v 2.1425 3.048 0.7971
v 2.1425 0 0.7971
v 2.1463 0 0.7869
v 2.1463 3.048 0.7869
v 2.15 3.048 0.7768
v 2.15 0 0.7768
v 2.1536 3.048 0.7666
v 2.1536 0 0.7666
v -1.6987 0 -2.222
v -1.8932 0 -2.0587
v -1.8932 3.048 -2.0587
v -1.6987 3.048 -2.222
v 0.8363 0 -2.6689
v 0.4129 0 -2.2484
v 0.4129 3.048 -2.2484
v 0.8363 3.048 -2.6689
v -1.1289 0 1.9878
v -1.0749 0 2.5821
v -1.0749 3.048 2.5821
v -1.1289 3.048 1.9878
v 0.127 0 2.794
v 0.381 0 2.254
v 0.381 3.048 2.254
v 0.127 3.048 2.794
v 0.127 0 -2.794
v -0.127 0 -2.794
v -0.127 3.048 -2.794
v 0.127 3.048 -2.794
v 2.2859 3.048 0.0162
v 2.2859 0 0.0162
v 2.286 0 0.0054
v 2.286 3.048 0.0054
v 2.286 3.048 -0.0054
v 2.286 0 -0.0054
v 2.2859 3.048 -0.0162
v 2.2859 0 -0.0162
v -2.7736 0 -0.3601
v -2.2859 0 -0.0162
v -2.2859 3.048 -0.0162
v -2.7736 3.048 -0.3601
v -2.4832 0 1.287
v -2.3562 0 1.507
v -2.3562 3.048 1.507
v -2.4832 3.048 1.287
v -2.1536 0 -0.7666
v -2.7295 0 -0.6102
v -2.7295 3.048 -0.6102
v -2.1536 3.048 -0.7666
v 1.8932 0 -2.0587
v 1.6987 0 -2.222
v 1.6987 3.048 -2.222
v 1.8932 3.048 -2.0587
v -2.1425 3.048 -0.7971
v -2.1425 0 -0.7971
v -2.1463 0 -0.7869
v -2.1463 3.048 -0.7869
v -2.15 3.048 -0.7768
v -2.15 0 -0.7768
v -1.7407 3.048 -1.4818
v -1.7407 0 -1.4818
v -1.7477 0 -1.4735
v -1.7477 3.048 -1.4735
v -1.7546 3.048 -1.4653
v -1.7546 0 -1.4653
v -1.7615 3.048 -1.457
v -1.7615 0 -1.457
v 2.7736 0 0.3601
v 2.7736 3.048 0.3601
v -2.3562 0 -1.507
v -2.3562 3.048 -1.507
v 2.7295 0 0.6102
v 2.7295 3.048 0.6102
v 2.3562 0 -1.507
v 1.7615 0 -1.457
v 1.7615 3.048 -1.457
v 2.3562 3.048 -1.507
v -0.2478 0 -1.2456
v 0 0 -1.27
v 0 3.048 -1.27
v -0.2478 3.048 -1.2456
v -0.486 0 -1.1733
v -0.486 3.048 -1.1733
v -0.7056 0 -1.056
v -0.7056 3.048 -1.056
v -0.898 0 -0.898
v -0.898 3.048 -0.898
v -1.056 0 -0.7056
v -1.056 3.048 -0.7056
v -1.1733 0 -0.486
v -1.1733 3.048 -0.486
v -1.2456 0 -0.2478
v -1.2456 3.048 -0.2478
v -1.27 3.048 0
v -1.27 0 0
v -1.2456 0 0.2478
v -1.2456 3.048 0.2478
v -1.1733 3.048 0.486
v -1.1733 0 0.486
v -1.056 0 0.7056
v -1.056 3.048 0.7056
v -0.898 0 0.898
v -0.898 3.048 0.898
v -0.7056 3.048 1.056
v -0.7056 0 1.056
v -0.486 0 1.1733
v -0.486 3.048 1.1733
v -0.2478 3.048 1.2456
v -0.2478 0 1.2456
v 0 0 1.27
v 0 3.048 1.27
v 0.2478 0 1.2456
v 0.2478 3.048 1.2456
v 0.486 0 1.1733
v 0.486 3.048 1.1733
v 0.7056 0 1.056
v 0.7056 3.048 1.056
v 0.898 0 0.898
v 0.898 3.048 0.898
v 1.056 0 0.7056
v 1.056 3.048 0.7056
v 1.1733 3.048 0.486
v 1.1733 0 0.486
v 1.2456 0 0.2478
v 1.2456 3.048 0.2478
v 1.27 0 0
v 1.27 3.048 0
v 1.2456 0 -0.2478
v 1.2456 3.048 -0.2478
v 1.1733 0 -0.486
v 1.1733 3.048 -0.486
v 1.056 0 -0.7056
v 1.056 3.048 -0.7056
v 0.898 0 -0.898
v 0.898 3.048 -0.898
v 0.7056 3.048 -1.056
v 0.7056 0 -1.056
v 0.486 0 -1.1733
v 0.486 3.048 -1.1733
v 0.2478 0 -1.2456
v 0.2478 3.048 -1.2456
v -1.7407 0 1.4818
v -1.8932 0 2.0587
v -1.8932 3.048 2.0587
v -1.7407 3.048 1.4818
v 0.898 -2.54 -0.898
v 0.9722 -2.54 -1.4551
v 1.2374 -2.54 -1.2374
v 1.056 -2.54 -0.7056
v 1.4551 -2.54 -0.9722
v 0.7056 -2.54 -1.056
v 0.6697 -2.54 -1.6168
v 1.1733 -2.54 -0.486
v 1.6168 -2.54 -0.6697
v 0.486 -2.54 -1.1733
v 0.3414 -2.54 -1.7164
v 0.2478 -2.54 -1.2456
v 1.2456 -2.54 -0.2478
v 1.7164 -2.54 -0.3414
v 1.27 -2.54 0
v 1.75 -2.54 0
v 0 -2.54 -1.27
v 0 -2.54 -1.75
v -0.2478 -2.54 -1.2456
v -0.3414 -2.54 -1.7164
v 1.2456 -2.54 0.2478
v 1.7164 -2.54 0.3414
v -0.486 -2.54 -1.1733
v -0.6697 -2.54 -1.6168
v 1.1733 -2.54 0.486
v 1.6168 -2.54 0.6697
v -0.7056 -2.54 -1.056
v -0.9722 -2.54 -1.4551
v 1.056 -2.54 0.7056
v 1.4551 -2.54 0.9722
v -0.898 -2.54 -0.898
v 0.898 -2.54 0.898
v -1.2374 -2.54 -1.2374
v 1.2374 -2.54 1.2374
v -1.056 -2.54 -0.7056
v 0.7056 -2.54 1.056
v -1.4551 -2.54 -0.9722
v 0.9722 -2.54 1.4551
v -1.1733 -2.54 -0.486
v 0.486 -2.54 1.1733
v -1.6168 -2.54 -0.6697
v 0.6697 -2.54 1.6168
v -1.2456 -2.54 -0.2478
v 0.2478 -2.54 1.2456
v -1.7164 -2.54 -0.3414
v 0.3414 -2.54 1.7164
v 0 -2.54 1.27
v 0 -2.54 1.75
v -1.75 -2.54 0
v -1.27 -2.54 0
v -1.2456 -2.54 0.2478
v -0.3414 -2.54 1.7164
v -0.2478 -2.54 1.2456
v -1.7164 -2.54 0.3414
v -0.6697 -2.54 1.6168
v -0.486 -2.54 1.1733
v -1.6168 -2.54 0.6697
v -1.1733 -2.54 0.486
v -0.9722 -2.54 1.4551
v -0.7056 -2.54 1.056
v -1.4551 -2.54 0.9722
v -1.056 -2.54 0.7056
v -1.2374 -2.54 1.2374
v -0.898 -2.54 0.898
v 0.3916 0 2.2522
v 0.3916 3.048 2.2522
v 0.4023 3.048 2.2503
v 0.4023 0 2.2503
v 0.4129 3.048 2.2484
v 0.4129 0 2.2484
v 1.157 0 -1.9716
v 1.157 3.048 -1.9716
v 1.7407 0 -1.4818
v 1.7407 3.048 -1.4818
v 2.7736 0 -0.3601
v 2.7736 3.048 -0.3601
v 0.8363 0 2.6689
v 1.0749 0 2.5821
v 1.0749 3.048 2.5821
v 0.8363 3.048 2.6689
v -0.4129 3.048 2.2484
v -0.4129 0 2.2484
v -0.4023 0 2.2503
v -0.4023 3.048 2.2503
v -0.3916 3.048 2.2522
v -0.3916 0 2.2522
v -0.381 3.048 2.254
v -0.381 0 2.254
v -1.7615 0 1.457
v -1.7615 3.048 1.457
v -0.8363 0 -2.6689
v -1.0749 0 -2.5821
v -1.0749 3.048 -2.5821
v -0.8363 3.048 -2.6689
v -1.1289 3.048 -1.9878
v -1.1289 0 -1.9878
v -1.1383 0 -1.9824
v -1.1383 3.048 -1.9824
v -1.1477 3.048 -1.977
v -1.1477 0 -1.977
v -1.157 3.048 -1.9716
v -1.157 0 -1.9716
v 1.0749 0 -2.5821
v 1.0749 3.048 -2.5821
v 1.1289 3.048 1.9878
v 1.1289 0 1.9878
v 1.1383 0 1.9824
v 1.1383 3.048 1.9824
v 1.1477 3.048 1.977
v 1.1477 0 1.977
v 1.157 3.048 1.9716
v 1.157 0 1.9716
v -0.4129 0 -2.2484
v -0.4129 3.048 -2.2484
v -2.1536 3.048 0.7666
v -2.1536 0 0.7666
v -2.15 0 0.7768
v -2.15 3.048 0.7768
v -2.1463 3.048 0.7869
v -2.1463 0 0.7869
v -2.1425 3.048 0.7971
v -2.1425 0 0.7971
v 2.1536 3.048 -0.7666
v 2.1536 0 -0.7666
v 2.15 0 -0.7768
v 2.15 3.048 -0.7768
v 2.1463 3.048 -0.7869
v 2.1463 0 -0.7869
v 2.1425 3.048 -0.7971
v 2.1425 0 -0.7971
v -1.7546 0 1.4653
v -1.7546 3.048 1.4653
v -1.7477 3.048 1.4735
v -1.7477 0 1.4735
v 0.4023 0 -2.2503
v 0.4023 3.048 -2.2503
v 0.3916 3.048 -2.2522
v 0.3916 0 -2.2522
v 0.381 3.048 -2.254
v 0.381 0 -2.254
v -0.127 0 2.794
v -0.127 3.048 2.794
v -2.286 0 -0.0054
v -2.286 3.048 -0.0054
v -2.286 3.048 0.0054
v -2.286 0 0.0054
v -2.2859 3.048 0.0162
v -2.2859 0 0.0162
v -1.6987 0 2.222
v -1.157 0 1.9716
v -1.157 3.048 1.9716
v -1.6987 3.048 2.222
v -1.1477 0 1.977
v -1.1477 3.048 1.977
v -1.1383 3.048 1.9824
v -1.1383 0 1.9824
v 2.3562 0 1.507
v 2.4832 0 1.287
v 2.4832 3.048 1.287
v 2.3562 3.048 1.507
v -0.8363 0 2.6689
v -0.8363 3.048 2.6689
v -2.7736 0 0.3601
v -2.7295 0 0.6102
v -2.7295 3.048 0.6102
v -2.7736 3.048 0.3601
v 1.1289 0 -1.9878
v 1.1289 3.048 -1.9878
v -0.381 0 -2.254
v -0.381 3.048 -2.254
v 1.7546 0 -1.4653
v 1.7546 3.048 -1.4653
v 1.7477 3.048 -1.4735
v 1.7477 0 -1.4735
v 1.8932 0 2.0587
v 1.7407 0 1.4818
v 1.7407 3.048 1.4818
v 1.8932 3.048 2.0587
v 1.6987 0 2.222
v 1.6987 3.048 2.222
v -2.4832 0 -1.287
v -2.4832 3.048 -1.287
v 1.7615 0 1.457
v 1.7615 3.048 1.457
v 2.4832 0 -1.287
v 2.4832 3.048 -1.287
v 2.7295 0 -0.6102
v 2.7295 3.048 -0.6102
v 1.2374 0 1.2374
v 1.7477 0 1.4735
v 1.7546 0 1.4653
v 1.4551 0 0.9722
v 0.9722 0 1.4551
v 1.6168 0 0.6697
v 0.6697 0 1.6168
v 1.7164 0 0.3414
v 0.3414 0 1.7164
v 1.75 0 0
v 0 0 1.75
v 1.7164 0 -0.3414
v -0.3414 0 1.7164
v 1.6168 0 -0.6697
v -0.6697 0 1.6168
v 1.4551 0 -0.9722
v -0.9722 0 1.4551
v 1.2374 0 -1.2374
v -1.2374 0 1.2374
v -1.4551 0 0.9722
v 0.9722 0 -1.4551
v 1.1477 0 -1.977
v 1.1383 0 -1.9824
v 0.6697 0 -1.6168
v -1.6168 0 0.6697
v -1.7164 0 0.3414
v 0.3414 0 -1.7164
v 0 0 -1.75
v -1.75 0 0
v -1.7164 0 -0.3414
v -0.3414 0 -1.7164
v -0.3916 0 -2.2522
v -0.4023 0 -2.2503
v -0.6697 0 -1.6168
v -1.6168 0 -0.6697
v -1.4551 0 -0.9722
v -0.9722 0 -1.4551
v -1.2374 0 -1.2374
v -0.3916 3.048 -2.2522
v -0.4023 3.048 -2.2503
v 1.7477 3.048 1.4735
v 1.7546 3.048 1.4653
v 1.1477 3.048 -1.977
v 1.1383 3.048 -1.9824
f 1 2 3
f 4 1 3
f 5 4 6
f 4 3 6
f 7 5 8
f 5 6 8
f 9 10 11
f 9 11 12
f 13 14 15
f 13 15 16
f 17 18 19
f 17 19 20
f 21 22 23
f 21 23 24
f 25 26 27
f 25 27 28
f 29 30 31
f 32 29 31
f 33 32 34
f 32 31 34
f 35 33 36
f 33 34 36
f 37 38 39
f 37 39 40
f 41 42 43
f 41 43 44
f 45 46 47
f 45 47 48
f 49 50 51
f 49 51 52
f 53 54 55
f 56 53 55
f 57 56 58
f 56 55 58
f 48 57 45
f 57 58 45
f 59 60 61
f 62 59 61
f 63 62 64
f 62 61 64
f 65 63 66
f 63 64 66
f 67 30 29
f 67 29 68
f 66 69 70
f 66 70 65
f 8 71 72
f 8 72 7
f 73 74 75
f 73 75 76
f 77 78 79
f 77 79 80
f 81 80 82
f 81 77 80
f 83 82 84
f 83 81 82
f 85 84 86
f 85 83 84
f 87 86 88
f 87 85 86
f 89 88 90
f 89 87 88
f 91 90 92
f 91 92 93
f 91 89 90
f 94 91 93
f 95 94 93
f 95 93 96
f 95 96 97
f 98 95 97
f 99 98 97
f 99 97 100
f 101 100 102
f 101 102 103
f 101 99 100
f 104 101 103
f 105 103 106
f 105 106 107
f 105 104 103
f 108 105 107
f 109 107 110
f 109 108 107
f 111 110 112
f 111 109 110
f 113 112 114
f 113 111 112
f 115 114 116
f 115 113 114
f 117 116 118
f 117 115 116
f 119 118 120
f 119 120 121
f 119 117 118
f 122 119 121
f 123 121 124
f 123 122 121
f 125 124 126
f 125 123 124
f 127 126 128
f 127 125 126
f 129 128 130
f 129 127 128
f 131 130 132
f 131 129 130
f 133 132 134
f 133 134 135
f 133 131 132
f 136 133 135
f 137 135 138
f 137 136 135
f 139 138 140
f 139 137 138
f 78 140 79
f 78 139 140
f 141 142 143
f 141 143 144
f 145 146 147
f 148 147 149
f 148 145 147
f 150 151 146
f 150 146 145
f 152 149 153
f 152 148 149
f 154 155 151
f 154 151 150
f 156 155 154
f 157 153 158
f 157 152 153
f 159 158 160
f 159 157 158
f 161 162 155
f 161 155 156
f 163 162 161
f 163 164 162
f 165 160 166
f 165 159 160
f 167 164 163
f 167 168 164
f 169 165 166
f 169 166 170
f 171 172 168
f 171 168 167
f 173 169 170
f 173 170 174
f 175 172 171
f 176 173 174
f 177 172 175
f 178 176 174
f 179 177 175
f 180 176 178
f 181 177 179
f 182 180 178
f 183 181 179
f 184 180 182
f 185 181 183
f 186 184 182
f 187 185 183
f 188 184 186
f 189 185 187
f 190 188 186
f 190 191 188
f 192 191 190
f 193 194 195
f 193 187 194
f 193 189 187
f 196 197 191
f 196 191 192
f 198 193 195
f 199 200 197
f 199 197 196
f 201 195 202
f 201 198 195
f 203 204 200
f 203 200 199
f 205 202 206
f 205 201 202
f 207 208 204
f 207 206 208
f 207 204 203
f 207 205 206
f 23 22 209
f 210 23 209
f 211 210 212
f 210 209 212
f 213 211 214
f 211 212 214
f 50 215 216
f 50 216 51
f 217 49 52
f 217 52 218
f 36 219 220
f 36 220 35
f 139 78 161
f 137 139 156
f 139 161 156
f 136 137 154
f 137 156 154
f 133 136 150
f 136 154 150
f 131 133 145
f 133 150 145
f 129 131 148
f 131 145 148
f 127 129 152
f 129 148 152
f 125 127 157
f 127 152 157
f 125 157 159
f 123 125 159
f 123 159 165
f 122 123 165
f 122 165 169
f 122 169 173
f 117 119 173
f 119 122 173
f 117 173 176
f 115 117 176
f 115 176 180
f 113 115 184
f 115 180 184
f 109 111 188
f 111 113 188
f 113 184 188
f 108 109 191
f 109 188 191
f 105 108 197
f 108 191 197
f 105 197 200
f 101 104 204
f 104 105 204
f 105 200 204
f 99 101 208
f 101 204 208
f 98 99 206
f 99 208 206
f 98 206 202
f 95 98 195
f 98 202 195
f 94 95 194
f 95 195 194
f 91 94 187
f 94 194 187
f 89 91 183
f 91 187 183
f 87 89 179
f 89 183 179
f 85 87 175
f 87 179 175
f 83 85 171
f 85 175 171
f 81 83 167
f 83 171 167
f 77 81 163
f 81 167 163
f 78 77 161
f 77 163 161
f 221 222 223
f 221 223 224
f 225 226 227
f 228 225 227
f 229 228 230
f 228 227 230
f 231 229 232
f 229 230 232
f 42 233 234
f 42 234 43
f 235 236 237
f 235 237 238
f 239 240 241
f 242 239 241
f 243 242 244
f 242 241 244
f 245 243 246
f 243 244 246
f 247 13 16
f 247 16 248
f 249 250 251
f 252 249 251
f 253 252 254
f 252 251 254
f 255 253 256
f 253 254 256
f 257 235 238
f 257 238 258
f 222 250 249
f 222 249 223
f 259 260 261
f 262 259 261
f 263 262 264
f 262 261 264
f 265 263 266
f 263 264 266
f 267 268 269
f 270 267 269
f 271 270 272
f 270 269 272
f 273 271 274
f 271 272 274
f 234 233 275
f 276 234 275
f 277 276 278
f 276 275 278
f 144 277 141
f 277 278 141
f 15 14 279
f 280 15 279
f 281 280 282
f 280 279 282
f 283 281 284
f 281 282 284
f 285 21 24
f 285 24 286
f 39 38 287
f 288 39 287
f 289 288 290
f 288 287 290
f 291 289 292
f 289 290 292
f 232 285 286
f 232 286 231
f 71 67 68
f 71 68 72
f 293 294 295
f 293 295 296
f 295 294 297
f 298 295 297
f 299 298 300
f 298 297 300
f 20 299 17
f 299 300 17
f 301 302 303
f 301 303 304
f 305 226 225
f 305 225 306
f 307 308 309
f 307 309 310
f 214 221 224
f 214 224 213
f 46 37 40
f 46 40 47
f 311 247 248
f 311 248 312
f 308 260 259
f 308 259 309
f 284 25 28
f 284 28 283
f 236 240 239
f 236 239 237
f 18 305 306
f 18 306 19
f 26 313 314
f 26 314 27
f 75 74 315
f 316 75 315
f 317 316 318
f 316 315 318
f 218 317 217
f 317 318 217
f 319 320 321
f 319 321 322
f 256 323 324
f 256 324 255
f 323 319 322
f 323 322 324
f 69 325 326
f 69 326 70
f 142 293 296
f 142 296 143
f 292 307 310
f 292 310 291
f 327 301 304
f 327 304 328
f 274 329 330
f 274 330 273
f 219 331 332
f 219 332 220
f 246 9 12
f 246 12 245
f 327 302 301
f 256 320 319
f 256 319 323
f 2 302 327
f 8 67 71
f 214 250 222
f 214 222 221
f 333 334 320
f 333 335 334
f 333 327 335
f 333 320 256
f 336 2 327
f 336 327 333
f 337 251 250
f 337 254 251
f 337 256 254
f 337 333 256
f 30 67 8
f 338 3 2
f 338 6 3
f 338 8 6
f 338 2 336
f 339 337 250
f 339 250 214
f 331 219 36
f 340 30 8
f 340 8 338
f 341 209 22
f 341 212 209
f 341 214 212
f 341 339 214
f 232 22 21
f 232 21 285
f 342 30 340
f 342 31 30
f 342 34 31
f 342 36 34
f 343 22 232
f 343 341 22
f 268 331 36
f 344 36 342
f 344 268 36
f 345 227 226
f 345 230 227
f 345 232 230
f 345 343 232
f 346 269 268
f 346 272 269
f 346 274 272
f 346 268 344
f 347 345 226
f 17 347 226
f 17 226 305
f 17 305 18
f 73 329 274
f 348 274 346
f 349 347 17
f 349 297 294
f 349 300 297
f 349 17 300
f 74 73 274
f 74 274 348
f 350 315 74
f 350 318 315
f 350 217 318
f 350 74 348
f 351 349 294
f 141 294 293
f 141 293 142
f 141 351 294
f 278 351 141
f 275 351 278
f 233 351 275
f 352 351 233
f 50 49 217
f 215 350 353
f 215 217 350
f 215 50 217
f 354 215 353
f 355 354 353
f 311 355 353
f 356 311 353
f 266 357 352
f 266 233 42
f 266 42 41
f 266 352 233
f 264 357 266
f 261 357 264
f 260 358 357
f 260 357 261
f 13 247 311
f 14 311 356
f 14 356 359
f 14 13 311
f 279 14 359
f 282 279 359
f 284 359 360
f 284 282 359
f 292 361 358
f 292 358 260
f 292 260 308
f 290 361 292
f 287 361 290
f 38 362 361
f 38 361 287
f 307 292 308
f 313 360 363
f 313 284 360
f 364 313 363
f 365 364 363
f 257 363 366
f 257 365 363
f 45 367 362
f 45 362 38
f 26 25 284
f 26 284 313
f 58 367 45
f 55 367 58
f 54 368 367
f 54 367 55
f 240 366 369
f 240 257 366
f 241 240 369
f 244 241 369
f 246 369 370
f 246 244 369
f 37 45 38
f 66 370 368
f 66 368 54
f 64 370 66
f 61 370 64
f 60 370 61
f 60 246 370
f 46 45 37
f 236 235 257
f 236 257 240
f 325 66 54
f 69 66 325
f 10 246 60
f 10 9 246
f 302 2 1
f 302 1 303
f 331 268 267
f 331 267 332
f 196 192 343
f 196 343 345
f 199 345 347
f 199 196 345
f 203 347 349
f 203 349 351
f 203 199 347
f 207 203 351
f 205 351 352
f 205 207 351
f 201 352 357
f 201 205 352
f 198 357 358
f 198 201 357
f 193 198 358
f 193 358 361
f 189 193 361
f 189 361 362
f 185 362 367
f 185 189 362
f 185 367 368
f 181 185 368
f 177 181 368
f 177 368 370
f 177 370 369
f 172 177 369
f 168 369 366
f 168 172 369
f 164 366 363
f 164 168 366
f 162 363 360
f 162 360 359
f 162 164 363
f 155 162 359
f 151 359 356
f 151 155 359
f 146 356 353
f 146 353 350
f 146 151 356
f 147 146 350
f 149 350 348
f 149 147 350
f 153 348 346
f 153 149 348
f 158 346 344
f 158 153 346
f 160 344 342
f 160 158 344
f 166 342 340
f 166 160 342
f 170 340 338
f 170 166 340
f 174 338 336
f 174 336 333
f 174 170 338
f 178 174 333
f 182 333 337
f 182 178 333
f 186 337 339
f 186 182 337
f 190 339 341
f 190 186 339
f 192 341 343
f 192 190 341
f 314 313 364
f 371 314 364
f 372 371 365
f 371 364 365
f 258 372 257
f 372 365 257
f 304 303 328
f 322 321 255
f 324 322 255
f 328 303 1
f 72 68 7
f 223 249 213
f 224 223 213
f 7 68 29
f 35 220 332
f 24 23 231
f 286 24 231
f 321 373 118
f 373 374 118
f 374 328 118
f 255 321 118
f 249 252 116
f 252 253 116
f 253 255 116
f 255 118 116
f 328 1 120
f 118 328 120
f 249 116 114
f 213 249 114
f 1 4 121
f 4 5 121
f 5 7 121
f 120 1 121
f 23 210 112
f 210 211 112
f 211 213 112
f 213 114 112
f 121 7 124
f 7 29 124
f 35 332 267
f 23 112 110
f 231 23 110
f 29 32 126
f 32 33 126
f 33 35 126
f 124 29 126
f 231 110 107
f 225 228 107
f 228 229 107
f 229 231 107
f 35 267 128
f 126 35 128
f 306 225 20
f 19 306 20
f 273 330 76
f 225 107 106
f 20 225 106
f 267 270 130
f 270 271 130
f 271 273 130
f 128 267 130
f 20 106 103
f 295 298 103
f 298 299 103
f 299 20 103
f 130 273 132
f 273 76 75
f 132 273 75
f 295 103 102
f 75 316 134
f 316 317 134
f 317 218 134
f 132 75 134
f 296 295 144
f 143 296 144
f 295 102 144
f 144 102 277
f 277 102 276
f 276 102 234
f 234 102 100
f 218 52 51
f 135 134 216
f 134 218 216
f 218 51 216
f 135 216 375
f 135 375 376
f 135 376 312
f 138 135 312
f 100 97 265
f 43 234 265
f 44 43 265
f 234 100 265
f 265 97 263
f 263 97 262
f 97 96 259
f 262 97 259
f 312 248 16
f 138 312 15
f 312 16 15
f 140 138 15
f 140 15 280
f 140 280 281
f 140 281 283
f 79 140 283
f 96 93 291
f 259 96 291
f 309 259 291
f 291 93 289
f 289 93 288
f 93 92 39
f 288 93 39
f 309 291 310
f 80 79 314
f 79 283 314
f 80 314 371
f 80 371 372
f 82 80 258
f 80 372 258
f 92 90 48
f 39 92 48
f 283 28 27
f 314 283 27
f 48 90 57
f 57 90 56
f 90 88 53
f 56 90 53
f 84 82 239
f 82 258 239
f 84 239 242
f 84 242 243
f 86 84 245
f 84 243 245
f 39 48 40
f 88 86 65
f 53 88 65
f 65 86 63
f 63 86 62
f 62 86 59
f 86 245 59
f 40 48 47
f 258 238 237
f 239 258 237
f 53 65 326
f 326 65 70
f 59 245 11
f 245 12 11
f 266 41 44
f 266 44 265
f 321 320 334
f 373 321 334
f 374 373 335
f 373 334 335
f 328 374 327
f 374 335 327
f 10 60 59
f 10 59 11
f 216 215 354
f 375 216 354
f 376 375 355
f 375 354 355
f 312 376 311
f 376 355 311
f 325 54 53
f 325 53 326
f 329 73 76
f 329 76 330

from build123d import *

# Parameters (mm, degrees)
SKETCH1_R           = 2.286
SKETCH1_R_2         = 1.27
BOSS_EXTRUDE1_DEPTH = 3.048
BOSS_EXTRUDE2_START = -3.048
BOSS_EXTRUDE2_DEPTH = 3.048
CIRPATTERN2_COUNT   = 18
BOSS_EXTRUDE3_START = 2.54
SKETCH3_R           = 1.75
SKETCH3_R_2         = 1.27
BOSS_EXTRUDE3_DEPTH = 2.54


with BuildPart() as part:
    # Sketch1 → Boss-Extrude1 (new body)
    with BuildSketch(Plane(origin=(0, 0, 0), x_dir=(1, 0, 0), z_dir=(0, 1, 0))):
        with Locations(Location((0, 0, 0), (0, 0, 90))):
            Circle(SKETCH1_R)
        with Locations(Location((0, 0, 0), (0, 0, 90))):
            Circle(SKETCH1_R_2, mode=Mode.SUBTRACT)
    extrude(amount=BOSS_EXTRUDE1_DEPTH)

    # Sketch2 → Boss-Extrude2 (add)
    with BuildSketch(Plane(origin=(0, 3.048, 0), x_dir=(1, 0, 0), z_dir=(0, 1, 0)).offset(BOSS_EXTRUDE2_START)):
        with BuildLine():
            Line((-0.127, 2.794), (0.127, 2.794))
            Line((0.127, 2.794), (0.381, 2.254026397))
            ThreePointArc((0.381, 2.254026397), (0, 2.286), (-0.381, 2.254026397))
            Line((-0.381, 2.254026397), (-0.127, 2.794))
        make_face()
    boss_extrude2 = extrude(amount=BOSS_EXTRUDE2_DEPTH)

    # CirPattern2: Boss-Extrude2 ×18 about axis
    cirpattern2_axis = Axis((0, 0, 0), (0, 1, 0))
    for i in range(1, CIRPATTERN2_COUNT):
        add(boss_extrude2.rotate(cirpattern2_axis, i * 360 / CIRPATTERN2_COUNT))

    # Sketch3 → Boss-Extrude3 (add)
    with BuildSketch(Plane(origin=(0, 0, 0), x_dir=(-1, 0, 0), z_dir=(0, -1, 0)).offset(BOSS_EXTRUDE3_START)):
        with Locations(Location((0, 0, 0), (0, 0, 270))):
            Circle(SKETCH3_R)
        with Locations(Location((0, 0, 0), (0, 0, 90))):
            Circle(SKETCH3_R_2, mode=Mode.SUBTRACT)
    extrude(amount=-BOSS_EXTRUDE3_DEPTH)


solid = part.part
